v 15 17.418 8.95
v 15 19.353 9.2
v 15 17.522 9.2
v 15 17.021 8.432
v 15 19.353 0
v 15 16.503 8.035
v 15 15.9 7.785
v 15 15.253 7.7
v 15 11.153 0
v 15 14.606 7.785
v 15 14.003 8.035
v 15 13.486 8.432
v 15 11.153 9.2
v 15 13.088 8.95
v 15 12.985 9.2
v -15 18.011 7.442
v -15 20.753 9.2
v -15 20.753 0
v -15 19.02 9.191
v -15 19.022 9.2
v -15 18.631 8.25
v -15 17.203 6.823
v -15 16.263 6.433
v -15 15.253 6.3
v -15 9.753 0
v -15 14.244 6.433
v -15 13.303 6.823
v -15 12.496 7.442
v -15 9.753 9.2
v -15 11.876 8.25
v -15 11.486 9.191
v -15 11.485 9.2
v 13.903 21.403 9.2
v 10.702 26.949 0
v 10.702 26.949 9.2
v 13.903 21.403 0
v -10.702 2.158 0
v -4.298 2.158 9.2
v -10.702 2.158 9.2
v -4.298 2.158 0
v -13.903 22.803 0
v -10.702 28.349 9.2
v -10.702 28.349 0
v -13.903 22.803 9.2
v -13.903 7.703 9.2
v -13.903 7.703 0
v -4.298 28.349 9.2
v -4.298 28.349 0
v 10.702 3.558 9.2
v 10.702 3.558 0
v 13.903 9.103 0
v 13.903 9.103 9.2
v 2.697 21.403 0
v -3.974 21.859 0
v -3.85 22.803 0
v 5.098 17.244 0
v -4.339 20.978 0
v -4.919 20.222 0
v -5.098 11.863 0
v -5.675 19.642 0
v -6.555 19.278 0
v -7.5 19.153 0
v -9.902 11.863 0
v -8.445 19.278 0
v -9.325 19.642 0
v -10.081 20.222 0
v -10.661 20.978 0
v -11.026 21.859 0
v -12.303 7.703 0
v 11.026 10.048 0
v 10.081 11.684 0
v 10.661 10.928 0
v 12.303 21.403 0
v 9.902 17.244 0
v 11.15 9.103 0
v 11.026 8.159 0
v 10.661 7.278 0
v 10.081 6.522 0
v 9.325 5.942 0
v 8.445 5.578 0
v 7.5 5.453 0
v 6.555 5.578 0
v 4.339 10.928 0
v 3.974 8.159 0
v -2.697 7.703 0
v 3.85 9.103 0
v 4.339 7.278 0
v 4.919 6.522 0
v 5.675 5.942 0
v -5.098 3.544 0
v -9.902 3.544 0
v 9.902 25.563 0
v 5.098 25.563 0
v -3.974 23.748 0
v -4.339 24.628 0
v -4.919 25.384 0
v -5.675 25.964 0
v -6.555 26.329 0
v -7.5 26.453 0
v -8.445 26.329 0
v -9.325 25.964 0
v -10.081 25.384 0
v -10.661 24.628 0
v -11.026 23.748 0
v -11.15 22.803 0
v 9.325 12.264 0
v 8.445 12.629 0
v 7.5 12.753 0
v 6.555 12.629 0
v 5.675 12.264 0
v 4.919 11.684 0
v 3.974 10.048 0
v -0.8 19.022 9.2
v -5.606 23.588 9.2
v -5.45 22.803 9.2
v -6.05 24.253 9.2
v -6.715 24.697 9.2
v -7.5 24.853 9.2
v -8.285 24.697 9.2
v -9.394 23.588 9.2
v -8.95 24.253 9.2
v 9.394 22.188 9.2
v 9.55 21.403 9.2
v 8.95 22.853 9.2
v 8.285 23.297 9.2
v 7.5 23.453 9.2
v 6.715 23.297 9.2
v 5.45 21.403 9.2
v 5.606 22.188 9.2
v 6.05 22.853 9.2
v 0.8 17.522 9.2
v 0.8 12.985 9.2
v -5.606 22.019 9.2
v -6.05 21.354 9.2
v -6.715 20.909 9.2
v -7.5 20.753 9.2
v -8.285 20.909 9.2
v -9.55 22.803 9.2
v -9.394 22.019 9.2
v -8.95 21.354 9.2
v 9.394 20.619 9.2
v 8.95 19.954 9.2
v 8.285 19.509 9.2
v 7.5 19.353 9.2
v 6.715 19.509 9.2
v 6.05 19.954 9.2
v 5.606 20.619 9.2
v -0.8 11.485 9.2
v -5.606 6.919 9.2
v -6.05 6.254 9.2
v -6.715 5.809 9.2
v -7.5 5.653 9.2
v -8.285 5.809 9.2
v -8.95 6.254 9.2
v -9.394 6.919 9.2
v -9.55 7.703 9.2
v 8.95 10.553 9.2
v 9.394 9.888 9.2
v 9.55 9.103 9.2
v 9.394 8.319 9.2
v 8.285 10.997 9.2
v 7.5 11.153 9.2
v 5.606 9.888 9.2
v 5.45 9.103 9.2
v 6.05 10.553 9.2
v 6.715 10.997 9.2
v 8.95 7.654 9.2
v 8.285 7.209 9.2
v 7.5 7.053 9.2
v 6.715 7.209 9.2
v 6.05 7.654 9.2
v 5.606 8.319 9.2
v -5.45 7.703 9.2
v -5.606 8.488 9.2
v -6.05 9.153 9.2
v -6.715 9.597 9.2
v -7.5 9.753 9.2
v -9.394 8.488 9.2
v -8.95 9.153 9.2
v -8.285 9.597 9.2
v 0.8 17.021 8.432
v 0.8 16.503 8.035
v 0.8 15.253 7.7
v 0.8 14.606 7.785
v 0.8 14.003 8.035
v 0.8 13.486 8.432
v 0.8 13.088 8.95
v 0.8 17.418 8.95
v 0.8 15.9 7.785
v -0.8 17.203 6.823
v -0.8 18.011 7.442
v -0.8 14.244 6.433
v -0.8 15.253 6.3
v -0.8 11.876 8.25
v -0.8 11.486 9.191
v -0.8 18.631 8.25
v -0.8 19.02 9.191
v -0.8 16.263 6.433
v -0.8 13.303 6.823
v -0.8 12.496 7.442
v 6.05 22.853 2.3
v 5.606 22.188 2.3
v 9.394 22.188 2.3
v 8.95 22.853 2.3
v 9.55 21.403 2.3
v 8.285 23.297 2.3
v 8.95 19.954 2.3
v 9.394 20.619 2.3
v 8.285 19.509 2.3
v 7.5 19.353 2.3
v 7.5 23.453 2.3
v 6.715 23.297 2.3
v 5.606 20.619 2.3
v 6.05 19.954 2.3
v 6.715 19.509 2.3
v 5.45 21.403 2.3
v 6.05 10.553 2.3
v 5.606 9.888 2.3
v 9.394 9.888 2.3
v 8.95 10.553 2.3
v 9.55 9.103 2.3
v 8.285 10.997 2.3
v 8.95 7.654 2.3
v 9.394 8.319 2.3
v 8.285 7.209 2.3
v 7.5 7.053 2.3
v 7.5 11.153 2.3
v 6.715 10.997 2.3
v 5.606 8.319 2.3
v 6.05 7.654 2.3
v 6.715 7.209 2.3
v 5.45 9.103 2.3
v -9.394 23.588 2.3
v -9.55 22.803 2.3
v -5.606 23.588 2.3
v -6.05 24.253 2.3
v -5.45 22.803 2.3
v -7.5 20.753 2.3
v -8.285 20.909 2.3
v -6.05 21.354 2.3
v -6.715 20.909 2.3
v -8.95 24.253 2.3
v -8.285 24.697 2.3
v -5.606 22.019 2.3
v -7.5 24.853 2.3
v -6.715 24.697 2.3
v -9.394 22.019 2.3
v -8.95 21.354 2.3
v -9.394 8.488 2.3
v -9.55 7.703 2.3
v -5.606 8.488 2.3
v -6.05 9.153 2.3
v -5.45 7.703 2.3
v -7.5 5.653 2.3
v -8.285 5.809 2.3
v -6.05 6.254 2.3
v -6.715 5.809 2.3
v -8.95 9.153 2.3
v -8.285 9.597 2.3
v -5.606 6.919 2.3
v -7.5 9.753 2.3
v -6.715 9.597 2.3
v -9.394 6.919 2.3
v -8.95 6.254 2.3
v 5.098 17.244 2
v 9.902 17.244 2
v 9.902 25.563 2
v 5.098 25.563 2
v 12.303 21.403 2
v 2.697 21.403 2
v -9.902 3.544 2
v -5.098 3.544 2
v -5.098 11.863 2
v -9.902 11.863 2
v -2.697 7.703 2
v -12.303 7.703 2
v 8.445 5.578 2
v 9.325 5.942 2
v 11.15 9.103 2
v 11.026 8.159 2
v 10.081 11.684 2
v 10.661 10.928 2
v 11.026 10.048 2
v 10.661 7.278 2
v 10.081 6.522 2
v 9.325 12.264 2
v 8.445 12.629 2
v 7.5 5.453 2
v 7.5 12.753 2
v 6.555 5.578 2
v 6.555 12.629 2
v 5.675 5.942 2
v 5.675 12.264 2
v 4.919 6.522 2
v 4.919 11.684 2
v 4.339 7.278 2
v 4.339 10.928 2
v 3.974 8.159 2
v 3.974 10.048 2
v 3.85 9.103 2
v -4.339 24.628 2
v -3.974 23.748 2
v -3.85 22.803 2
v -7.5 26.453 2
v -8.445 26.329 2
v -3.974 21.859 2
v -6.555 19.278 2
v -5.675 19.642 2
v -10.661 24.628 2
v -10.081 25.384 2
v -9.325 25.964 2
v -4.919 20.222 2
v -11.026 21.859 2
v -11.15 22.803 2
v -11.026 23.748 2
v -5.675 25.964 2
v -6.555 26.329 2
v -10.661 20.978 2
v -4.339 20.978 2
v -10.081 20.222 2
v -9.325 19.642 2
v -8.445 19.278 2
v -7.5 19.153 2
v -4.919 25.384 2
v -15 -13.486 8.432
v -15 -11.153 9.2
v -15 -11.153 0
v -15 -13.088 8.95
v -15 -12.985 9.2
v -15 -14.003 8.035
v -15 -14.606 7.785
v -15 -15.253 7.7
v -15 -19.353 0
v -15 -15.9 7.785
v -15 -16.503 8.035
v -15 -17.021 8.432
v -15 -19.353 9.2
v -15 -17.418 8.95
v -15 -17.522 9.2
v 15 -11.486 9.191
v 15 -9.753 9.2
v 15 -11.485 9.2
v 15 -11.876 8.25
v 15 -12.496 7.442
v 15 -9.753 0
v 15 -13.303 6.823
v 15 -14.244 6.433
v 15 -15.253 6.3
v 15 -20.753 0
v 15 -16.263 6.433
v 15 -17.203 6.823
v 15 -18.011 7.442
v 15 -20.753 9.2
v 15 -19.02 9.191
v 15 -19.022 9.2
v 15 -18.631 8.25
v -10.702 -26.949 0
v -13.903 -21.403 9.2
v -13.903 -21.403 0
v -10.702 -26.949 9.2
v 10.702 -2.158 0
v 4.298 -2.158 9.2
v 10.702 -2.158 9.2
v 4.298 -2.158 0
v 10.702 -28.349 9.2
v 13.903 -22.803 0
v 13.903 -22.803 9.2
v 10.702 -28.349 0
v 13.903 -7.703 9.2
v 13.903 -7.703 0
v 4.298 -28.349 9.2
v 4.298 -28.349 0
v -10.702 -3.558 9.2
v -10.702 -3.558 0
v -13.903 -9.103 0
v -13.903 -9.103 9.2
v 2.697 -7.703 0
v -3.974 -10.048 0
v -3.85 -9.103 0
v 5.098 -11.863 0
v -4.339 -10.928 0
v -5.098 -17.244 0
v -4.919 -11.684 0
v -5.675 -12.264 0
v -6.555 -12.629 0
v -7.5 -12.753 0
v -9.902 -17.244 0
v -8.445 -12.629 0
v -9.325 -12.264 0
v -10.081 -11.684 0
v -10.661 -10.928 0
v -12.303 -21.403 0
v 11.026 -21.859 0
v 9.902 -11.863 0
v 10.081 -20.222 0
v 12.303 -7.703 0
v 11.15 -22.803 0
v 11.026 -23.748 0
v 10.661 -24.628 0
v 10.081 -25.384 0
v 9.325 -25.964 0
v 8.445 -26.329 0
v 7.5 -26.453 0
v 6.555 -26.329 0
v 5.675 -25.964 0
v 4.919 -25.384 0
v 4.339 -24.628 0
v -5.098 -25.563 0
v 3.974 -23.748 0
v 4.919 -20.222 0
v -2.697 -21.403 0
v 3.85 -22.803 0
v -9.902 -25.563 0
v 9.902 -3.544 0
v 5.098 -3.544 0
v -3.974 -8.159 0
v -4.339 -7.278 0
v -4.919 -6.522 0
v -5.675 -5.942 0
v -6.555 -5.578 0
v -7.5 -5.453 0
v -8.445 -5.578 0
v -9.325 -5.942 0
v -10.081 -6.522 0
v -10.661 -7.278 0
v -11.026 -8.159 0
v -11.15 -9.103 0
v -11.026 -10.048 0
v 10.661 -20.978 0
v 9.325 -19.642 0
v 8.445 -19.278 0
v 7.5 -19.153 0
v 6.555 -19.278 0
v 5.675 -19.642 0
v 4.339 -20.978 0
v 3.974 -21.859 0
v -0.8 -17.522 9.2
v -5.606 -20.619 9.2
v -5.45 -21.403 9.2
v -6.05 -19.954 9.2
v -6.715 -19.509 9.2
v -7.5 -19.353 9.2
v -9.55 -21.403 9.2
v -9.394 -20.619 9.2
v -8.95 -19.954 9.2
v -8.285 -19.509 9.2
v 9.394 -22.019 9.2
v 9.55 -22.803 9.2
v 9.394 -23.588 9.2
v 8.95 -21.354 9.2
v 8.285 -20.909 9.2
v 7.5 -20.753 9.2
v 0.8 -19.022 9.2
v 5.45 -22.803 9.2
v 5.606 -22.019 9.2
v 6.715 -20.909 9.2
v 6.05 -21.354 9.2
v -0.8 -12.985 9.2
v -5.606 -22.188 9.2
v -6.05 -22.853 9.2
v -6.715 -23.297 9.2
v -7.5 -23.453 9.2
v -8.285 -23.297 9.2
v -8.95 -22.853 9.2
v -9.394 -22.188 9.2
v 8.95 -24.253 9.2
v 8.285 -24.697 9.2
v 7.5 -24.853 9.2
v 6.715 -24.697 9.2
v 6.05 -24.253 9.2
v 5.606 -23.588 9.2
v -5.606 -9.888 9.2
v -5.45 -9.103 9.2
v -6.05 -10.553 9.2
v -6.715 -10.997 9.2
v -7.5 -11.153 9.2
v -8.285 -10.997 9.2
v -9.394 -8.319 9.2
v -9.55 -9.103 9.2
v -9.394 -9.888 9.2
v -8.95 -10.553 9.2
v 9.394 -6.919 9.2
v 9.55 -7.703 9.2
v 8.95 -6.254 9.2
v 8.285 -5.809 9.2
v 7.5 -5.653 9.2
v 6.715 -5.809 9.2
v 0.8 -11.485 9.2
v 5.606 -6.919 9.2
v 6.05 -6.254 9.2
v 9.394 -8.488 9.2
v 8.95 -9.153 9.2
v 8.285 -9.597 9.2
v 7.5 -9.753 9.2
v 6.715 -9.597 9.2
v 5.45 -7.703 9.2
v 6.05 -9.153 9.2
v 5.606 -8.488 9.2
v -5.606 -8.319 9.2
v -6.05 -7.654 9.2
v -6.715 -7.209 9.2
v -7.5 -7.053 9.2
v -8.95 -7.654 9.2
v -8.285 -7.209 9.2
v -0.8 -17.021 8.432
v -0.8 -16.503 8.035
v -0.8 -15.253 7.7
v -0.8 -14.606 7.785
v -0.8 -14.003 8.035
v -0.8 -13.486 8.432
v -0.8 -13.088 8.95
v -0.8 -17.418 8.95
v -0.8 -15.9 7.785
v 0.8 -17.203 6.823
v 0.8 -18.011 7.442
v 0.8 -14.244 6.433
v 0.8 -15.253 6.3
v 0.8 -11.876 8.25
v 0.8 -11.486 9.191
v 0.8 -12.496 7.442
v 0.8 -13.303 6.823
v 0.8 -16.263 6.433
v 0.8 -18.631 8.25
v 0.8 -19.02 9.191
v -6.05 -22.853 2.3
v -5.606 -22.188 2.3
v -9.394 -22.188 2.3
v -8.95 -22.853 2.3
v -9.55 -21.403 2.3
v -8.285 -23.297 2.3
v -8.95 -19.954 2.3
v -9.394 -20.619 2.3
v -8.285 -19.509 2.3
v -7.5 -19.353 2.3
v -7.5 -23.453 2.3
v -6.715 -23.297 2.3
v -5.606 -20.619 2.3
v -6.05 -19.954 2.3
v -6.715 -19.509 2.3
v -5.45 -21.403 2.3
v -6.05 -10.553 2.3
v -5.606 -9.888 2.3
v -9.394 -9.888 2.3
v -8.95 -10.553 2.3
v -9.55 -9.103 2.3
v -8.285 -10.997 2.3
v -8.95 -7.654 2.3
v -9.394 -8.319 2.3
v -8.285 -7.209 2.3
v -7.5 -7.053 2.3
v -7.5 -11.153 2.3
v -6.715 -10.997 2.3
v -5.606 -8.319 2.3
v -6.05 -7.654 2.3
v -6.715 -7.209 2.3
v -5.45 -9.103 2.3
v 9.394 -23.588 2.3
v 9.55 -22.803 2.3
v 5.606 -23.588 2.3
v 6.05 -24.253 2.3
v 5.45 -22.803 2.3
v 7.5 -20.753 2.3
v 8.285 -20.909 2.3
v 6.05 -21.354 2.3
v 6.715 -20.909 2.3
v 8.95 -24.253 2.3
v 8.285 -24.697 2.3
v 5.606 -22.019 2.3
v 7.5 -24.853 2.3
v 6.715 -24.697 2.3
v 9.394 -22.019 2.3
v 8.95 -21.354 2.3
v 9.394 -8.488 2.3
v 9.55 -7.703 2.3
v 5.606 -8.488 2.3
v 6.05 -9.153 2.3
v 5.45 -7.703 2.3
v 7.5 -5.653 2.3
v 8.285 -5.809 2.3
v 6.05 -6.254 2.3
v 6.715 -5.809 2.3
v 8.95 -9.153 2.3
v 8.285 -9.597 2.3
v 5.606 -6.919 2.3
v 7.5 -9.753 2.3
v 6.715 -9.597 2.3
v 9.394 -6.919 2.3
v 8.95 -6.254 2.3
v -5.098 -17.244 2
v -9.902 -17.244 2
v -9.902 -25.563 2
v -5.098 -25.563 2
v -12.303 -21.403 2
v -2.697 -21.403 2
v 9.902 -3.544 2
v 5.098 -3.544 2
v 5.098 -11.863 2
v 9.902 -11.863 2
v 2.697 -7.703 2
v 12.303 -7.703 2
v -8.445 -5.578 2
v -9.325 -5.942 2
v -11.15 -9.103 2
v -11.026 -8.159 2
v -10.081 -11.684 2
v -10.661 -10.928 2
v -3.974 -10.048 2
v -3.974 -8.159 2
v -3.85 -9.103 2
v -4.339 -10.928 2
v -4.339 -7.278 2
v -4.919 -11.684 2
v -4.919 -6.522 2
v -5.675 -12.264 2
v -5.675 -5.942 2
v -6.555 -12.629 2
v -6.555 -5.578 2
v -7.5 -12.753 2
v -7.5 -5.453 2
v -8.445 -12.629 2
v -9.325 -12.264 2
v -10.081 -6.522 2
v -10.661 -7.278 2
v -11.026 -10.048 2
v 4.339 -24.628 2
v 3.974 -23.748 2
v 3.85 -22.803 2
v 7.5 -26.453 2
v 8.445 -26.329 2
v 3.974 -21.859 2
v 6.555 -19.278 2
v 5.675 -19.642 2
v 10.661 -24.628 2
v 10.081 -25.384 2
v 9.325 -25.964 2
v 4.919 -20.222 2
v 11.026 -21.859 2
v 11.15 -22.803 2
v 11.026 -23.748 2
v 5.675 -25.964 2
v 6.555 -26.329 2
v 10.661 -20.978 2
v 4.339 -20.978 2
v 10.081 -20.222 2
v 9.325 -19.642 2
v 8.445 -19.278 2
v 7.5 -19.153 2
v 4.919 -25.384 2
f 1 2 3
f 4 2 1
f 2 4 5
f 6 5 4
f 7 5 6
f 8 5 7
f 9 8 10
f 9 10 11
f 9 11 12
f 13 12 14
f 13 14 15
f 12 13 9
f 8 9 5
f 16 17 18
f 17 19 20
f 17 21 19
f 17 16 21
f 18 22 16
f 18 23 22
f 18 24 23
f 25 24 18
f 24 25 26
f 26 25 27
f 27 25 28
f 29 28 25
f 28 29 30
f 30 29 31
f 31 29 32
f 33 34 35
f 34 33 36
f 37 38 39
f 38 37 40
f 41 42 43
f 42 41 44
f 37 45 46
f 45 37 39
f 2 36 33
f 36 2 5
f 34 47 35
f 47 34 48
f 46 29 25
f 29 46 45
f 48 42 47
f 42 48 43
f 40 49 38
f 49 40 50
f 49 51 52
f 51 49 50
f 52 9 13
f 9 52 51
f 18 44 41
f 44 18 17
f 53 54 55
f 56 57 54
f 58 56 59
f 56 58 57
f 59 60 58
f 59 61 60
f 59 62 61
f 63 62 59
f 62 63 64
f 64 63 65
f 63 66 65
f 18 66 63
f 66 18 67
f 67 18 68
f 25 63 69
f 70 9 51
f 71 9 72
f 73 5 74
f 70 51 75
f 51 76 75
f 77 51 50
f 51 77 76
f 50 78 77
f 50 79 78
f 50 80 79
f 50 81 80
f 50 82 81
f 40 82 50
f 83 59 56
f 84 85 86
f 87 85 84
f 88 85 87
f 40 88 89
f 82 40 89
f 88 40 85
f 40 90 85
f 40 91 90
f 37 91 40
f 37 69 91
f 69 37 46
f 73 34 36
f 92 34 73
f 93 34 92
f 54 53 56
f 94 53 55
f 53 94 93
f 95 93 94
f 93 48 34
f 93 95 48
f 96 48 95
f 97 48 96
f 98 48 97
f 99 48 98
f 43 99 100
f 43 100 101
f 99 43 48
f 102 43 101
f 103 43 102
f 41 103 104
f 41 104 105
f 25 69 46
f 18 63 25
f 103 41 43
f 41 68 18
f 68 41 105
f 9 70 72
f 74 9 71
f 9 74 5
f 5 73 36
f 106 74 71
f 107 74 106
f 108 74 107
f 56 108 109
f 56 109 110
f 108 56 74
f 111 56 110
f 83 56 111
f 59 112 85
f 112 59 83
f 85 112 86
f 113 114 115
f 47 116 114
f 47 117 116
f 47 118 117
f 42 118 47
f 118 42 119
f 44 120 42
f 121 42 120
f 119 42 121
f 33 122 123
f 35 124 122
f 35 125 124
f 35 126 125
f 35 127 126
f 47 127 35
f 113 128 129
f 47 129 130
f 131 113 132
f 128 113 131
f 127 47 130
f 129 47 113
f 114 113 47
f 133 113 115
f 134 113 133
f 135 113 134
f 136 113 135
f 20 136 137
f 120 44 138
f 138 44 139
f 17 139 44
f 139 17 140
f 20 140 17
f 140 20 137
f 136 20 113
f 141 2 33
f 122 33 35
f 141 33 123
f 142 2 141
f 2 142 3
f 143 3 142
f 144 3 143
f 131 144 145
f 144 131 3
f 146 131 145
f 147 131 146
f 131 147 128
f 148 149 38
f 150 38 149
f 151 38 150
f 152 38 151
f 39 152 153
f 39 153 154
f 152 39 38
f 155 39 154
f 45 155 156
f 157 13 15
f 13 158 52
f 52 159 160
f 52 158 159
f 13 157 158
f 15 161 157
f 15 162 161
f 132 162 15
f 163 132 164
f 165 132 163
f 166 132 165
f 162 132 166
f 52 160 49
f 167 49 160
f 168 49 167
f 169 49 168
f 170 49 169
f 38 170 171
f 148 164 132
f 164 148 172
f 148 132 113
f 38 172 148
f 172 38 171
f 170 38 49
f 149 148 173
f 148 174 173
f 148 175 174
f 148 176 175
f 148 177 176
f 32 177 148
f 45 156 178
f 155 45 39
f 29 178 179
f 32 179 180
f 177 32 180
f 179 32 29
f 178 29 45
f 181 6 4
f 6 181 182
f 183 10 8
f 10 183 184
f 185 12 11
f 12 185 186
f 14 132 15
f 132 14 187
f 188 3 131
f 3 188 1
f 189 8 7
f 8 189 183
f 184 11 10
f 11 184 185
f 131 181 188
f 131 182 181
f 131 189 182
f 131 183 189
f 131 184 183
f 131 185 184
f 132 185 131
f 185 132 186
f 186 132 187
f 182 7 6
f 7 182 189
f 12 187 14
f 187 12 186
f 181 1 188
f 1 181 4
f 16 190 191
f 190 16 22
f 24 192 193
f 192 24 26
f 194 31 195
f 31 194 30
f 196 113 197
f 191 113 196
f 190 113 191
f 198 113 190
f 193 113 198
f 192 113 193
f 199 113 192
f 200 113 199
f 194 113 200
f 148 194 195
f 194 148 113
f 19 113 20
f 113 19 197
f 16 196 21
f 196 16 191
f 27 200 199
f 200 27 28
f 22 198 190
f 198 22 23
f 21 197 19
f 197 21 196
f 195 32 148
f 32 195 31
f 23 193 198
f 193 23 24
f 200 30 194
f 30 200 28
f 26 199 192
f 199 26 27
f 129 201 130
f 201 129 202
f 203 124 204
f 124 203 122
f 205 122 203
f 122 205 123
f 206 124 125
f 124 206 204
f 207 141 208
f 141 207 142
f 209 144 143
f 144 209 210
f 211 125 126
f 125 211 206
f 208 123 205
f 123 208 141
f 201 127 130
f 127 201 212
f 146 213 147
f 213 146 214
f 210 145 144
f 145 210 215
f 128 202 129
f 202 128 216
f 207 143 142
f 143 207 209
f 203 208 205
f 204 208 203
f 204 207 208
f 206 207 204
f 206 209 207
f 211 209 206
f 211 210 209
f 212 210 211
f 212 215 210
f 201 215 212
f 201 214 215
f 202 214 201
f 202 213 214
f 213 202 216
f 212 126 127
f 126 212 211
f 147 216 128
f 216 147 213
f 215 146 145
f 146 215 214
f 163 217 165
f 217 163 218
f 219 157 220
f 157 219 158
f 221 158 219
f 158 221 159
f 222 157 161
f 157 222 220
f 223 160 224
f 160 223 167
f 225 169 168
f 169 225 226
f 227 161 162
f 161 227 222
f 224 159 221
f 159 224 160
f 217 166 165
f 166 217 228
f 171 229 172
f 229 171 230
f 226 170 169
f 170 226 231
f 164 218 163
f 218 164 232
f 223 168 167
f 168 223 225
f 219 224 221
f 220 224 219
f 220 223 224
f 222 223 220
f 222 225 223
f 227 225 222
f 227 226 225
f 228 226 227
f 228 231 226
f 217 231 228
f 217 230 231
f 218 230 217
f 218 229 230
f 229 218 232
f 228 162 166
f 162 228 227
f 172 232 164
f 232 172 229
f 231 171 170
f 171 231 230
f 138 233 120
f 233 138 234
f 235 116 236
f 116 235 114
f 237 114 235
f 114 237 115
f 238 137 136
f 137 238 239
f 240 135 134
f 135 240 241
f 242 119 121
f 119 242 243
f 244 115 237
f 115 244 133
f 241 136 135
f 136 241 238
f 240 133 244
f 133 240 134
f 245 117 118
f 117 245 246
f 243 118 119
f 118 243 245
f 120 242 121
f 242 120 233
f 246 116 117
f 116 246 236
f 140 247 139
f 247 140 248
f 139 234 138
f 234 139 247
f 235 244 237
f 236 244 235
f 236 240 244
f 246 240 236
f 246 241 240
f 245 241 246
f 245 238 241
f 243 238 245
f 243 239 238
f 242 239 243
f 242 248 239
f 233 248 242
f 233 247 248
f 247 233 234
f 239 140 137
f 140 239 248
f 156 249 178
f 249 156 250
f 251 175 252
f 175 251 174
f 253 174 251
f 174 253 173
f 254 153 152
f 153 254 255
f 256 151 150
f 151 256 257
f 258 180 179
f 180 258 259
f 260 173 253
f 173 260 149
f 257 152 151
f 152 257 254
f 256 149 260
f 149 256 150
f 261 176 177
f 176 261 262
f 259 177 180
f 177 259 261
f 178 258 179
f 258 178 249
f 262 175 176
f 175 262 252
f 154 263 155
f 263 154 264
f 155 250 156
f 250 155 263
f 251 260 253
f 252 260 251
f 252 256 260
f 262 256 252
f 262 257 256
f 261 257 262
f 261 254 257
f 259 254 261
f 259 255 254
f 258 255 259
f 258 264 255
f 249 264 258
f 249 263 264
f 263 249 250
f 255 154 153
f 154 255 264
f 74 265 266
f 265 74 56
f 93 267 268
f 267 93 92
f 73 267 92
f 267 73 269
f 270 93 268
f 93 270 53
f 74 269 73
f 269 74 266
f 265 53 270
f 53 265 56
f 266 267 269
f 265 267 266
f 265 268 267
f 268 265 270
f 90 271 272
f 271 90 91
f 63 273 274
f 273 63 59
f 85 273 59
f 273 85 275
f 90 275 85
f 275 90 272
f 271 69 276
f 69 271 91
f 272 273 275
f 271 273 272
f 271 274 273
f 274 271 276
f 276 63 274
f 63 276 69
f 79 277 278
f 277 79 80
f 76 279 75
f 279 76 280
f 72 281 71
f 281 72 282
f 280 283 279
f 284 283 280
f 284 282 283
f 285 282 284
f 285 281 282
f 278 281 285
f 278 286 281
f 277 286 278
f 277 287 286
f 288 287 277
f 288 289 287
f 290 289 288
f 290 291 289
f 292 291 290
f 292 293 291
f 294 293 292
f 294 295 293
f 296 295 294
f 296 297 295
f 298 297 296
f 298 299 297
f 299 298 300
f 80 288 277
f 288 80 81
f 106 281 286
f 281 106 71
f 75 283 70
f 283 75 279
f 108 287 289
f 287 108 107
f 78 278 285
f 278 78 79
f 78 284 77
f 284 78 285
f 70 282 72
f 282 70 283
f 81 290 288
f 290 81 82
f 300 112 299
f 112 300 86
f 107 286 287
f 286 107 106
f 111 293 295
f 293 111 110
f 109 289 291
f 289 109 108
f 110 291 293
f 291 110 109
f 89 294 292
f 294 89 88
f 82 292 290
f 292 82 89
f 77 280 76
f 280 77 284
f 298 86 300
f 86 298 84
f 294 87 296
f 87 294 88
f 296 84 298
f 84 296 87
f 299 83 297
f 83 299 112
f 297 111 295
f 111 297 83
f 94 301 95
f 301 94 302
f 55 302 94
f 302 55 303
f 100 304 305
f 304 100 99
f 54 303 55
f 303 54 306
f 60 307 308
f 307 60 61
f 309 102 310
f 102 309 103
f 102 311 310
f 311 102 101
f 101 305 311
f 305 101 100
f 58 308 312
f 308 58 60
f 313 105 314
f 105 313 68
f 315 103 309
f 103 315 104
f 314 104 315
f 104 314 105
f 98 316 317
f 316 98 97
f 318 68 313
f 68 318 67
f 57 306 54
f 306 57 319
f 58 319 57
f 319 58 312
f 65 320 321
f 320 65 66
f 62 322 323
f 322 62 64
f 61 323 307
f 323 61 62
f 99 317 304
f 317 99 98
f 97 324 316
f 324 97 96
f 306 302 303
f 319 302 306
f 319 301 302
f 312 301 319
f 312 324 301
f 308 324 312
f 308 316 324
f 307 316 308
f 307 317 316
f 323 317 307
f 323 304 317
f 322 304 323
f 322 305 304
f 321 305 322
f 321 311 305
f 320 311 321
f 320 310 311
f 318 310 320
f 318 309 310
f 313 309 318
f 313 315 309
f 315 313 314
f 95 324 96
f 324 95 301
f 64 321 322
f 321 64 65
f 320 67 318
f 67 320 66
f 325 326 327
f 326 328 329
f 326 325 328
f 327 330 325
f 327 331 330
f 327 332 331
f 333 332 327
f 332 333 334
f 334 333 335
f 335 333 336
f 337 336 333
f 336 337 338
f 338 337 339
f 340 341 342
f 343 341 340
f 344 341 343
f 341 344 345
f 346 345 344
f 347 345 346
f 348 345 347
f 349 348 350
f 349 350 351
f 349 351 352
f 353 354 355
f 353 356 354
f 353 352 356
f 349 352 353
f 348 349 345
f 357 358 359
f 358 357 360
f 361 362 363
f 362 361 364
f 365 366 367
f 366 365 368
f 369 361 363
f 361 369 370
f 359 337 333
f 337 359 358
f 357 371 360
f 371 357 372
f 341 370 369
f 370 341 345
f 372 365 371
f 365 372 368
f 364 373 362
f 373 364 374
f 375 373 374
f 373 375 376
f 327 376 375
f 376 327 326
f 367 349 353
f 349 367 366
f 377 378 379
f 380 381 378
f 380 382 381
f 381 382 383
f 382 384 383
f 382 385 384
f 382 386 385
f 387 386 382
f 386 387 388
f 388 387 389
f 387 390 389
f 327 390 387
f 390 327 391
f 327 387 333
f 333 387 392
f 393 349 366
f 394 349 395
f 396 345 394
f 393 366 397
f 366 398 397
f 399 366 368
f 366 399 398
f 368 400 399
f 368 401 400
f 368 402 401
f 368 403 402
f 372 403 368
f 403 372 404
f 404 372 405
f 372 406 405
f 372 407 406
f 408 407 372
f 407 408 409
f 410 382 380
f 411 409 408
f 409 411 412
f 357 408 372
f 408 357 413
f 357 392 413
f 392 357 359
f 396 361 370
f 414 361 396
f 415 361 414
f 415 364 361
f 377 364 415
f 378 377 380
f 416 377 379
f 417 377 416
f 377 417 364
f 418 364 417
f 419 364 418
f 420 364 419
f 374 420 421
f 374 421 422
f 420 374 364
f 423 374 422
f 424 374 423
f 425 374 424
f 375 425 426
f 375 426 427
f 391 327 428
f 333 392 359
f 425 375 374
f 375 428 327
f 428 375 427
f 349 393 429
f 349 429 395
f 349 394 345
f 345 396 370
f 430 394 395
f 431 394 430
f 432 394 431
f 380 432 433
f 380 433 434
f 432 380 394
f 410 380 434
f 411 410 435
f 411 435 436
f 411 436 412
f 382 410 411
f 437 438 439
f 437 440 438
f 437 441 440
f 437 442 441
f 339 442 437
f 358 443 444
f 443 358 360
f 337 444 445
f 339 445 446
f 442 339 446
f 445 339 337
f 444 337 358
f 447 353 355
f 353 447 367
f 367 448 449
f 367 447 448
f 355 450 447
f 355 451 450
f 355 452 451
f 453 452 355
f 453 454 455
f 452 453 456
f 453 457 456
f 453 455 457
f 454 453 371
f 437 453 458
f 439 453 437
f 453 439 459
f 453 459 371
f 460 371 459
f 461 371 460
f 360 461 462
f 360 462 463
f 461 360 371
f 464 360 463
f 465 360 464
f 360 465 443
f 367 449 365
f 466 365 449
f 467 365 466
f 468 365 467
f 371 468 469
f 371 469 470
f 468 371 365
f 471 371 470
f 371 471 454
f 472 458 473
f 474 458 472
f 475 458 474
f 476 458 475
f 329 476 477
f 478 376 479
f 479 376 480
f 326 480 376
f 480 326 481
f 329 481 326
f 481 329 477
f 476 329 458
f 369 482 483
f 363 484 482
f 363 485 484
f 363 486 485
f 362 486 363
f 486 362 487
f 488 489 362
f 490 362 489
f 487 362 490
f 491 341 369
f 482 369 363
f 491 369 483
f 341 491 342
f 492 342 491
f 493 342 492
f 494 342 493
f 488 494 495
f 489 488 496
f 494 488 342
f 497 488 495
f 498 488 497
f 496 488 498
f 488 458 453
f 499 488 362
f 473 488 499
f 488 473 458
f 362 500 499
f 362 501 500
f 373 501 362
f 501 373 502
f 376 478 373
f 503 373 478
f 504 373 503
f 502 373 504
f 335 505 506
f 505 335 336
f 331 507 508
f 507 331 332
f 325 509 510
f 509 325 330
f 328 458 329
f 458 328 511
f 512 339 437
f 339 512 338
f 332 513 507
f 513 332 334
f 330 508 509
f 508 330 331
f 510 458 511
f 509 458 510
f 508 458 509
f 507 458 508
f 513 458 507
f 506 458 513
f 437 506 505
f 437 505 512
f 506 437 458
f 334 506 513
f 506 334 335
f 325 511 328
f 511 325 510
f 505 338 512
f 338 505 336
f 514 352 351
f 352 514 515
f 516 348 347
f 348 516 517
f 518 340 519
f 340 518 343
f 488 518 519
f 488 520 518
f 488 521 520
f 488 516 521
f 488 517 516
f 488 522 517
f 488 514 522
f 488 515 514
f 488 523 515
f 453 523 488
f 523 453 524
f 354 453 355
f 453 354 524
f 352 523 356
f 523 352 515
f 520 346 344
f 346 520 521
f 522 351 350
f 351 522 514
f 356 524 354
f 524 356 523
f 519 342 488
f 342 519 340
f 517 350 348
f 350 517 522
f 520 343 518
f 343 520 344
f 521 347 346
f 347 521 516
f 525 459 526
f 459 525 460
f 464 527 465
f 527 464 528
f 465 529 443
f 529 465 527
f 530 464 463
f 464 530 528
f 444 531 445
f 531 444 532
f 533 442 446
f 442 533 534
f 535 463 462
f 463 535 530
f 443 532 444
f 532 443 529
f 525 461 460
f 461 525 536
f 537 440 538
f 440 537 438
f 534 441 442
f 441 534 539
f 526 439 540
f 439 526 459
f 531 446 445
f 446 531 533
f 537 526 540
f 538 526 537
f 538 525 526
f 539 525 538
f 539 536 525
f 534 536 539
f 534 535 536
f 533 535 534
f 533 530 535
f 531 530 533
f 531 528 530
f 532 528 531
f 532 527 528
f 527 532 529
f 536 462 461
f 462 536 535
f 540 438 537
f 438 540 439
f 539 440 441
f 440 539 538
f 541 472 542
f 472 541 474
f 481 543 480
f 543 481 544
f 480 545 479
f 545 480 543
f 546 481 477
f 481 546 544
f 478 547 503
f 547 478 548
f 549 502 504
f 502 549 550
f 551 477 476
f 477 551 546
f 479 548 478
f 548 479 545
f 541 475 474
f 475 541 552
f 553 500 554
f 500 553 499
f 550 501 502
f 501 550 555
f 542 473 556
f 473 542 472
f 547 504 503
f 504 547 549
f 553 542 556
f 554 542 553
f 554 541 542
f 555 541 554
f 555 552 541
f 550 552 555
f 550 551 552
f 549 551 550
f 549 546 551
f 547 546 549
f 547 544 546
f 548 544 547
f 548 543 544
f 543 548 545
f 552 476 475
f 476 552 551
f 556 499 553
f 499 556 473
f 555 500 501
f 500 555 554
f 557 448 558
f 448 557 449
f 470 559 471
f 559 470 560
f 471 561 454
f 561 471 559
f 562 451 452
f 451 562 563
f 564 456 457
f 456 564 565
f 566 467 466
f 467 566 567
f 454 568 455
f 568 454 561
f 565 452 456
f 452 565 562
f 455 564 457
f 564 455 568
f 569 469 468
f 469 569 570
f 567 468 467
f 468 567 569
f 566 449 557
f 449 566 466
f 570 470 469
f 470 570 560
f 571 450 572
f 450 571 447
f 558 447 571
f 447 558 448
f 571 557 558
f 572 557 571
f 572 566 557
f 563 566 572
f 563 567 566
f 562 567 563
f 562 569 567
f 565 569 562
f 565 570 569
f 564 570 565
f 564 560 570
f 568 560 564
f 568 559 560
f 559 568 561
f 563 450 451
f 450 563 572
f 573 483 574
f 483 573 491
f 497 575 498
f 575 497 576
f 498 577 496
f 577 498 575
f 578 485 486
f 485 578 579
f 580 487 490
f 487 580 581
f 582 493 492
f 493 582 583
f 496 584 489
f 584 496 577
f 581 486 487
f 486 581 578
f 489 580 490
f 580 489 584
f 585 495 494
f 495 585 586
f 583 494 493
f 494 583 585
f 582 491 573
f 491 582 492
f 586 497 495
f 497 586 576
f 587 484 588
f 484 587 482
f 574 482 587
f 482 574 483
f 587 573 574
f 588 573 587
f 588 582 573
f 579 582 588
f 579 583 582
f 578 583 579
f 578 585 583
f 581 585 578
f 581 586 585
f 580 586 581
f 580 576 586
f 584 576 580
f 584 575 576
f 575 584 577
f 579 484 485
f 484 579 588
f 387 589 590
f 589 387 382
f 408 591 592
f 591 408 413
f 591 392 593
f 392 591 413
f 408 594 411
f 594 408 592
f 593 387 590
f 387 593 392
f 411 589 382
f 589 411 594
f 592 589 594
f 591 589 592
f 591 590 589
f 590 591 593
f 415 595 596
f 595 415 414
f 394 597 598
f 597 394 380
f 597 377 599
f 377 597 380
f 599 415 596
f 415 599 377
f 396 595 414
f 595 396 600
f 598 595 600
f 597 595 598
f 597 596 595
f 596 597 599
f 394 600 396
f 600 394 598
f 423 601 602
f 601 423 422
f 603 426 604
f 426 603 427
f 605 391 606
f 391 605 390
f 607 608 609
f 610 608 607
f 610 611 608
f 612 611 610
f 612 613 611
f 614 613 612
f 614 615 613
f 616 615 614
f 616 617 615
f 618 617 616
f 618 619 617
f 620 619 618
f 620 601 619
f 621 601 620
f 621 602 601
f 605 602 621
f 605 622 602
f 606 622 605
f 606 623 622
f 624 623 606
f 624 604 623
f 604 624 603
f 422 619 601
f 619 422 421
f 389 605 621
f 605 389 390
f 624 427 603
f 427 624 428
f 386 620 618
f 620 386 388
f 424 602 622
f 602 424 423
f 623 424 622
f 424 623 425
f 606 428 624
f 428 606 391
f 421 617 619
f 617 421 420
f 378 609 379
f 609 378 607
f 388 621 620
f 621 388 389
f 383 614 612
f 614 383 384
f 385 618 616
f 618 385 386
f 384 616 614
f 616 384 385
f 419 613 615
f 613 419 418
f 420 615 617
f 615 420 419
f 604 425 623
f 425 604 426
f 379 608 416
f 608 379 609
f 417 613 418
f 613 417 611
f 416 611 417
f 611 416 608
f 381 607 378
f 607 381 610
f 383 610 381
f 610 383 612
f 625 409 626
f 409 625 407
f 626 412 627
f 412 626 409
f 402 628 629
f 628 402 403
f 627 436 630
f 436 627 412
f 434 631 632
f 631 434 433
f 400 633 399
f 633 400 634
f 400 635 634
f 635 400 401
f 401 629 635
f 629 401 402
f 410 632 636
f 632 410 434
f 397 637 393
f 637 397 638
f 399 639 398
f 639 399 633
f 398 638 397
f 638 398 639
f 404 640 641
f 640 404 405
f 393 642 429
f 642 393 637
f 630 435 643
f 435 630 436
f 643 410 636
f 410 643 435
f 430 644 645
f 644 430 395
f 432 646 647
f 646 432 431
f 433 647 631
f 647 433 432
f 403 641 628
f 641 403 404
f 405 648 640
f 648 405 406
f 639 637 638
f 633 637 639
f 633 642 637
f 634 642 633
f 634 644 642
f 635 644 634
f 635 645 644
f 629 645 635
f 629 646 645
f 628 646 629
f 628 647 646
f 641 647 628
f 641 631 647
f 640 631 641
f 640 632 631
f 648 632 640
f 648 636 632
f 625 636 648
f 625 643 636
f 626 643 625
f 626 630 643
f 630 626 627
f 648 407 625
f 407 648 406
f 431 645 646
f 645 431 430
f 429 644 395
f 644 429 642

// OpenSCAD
//code by Griffin Nicoll 2013
//GNU GPL v3

//shaft diameter
shaft1 = 5;
//shaft diameter
shaft2 = 7.8;
//diameter of bolt shaft
boltShaft = 3.5;
//diameter of bolt head
boltHead = 6.7;
//diameter of washer. 0 if unused
washer = 0;
//diameter across nut flats
nut = 7.8;
//depth of nut trap
trap = 2;
//minimun coupling length
length = 30;
//thinest part of the back
thickness = 4;
//distance between halfs so it can clamp down
offset = 2;
//bridge on top of traps (one layer height)
bridge = 0.3;
//gap between sliding parts
gap = 0.3;
//width of thinnest stable wall
wall = 1.6;

//generated dimensions
height = thickness+trap+max(shaft1,shaft2)/2+gap;
nutR = nut/(2*cos(30));
boltX = max(min(length/2-max(boltHead/2,nutR+gap+wall),length/4),
		boltHead/4+nutR/2+gap+wall/2,washer/2+gap+wall/2);
boltY1 = max((shaft1+boltShaft)/2+gap+wall,boltHead/2+gap+wall/2,
		nut/2+gap+wall/2,washer/2+gap+wall/2);
boltY2 = max((shaft2+boltShaft)/2+gap+wall,boltHead/2+gap+wall/2,
		nut/2+gap+wall/2,washer/2+gap+wall/2);

//placing sides
for(a=[0,1])rotate([0,0,a*180])translate([0,max(boltY1,boltY2)+
	max(boltHead/2,nutR,washer/2)+gap*2+wall+1])clamp();

module clamp(){
difference(){
	clampBlock();
	//shaft1
	translate([wall/2,0,height])rotate([0,90,0])
		cylinder(r=shaft1/2,h=2*max(boltX+1,nutR+gap+wall,boltHead+gap+wall),$fn=24);
	//shaft2
	translate([-wall/2,0,height])rotate([0,-90,0])
		cylinder(r=shaft2/2,h=2*max(boltX+1,nutR+gap+wall,boltHead+gap+wall),$fn=24);
	//bolt holes
	translate([boltX,boltY1,trap+bridge])cylinder(r=boltShaft/2+gap,h=height,$fn=16);
	translate([boltX,-boltY1,trap+bridge])cylinder(r=boltShaft/2+gap,h=height,$fn=16);
	translate([-boltX,boltY2,trap+bridge])cylinder(r=boltShaft/2+gap,h=height,$fn=16);
	translate([-boltX,-boltY2,trap+bridge])cylinder(r=boltShaft/2+gap,h=height,$fn=16);
	//nut traps
	translate([boltX,boltY1,-1])cylinder(r=nutR+gap,h=trap+1,$fn=6);
	translate([-boltX,-boltY2,-1])cylinder(r=nutR+gap,h=trap+1,$fn=6);
	//washers
	if(washer>0){
		translate([boltX,boltY1,-1])cylinder(r=washer/2+gap,h=trap+1,$fn=24);
		translate([-boltX,-boltY2,-1])cylinder(r=washer/2+gap,h=trap+1,$fn=24);
	}
	//bolt traps or washers
	translate([boltX,-boltY1,-1])cylinder(r=max(boltHead,washer)/2+gap,h=trap+1,$fn=24);
	translate([-boltX,boltY2,-1])cylinder(r=max(boltHead,washer)/2+gap,h=trap+1,$fn=24);
}
}

module clampBlock(){
linear_extrude(height=height-offset/2){
	hull(){
		translate([length/2-1,0])square(size=[2,shaft1+wall*2],center=true);
		translate([-length/2+1,0])square(size=[2,shaft2+wall*2],center=true);
		translate([boltX,boltY1])clampCorner();
		translate([boltX,-boltY1])clampCorner();
		translate([-boltX,boltY2])clampCorner();
		translate([-boltX,-boltY2])clampCorner();
	}
}
}

module clampCorner(){
	union(){
		circle(max(washer,boltHead)/2+gap+wall,$fn=24);
		circle(nutR+gap+wall,$fn=6);
	}
}
